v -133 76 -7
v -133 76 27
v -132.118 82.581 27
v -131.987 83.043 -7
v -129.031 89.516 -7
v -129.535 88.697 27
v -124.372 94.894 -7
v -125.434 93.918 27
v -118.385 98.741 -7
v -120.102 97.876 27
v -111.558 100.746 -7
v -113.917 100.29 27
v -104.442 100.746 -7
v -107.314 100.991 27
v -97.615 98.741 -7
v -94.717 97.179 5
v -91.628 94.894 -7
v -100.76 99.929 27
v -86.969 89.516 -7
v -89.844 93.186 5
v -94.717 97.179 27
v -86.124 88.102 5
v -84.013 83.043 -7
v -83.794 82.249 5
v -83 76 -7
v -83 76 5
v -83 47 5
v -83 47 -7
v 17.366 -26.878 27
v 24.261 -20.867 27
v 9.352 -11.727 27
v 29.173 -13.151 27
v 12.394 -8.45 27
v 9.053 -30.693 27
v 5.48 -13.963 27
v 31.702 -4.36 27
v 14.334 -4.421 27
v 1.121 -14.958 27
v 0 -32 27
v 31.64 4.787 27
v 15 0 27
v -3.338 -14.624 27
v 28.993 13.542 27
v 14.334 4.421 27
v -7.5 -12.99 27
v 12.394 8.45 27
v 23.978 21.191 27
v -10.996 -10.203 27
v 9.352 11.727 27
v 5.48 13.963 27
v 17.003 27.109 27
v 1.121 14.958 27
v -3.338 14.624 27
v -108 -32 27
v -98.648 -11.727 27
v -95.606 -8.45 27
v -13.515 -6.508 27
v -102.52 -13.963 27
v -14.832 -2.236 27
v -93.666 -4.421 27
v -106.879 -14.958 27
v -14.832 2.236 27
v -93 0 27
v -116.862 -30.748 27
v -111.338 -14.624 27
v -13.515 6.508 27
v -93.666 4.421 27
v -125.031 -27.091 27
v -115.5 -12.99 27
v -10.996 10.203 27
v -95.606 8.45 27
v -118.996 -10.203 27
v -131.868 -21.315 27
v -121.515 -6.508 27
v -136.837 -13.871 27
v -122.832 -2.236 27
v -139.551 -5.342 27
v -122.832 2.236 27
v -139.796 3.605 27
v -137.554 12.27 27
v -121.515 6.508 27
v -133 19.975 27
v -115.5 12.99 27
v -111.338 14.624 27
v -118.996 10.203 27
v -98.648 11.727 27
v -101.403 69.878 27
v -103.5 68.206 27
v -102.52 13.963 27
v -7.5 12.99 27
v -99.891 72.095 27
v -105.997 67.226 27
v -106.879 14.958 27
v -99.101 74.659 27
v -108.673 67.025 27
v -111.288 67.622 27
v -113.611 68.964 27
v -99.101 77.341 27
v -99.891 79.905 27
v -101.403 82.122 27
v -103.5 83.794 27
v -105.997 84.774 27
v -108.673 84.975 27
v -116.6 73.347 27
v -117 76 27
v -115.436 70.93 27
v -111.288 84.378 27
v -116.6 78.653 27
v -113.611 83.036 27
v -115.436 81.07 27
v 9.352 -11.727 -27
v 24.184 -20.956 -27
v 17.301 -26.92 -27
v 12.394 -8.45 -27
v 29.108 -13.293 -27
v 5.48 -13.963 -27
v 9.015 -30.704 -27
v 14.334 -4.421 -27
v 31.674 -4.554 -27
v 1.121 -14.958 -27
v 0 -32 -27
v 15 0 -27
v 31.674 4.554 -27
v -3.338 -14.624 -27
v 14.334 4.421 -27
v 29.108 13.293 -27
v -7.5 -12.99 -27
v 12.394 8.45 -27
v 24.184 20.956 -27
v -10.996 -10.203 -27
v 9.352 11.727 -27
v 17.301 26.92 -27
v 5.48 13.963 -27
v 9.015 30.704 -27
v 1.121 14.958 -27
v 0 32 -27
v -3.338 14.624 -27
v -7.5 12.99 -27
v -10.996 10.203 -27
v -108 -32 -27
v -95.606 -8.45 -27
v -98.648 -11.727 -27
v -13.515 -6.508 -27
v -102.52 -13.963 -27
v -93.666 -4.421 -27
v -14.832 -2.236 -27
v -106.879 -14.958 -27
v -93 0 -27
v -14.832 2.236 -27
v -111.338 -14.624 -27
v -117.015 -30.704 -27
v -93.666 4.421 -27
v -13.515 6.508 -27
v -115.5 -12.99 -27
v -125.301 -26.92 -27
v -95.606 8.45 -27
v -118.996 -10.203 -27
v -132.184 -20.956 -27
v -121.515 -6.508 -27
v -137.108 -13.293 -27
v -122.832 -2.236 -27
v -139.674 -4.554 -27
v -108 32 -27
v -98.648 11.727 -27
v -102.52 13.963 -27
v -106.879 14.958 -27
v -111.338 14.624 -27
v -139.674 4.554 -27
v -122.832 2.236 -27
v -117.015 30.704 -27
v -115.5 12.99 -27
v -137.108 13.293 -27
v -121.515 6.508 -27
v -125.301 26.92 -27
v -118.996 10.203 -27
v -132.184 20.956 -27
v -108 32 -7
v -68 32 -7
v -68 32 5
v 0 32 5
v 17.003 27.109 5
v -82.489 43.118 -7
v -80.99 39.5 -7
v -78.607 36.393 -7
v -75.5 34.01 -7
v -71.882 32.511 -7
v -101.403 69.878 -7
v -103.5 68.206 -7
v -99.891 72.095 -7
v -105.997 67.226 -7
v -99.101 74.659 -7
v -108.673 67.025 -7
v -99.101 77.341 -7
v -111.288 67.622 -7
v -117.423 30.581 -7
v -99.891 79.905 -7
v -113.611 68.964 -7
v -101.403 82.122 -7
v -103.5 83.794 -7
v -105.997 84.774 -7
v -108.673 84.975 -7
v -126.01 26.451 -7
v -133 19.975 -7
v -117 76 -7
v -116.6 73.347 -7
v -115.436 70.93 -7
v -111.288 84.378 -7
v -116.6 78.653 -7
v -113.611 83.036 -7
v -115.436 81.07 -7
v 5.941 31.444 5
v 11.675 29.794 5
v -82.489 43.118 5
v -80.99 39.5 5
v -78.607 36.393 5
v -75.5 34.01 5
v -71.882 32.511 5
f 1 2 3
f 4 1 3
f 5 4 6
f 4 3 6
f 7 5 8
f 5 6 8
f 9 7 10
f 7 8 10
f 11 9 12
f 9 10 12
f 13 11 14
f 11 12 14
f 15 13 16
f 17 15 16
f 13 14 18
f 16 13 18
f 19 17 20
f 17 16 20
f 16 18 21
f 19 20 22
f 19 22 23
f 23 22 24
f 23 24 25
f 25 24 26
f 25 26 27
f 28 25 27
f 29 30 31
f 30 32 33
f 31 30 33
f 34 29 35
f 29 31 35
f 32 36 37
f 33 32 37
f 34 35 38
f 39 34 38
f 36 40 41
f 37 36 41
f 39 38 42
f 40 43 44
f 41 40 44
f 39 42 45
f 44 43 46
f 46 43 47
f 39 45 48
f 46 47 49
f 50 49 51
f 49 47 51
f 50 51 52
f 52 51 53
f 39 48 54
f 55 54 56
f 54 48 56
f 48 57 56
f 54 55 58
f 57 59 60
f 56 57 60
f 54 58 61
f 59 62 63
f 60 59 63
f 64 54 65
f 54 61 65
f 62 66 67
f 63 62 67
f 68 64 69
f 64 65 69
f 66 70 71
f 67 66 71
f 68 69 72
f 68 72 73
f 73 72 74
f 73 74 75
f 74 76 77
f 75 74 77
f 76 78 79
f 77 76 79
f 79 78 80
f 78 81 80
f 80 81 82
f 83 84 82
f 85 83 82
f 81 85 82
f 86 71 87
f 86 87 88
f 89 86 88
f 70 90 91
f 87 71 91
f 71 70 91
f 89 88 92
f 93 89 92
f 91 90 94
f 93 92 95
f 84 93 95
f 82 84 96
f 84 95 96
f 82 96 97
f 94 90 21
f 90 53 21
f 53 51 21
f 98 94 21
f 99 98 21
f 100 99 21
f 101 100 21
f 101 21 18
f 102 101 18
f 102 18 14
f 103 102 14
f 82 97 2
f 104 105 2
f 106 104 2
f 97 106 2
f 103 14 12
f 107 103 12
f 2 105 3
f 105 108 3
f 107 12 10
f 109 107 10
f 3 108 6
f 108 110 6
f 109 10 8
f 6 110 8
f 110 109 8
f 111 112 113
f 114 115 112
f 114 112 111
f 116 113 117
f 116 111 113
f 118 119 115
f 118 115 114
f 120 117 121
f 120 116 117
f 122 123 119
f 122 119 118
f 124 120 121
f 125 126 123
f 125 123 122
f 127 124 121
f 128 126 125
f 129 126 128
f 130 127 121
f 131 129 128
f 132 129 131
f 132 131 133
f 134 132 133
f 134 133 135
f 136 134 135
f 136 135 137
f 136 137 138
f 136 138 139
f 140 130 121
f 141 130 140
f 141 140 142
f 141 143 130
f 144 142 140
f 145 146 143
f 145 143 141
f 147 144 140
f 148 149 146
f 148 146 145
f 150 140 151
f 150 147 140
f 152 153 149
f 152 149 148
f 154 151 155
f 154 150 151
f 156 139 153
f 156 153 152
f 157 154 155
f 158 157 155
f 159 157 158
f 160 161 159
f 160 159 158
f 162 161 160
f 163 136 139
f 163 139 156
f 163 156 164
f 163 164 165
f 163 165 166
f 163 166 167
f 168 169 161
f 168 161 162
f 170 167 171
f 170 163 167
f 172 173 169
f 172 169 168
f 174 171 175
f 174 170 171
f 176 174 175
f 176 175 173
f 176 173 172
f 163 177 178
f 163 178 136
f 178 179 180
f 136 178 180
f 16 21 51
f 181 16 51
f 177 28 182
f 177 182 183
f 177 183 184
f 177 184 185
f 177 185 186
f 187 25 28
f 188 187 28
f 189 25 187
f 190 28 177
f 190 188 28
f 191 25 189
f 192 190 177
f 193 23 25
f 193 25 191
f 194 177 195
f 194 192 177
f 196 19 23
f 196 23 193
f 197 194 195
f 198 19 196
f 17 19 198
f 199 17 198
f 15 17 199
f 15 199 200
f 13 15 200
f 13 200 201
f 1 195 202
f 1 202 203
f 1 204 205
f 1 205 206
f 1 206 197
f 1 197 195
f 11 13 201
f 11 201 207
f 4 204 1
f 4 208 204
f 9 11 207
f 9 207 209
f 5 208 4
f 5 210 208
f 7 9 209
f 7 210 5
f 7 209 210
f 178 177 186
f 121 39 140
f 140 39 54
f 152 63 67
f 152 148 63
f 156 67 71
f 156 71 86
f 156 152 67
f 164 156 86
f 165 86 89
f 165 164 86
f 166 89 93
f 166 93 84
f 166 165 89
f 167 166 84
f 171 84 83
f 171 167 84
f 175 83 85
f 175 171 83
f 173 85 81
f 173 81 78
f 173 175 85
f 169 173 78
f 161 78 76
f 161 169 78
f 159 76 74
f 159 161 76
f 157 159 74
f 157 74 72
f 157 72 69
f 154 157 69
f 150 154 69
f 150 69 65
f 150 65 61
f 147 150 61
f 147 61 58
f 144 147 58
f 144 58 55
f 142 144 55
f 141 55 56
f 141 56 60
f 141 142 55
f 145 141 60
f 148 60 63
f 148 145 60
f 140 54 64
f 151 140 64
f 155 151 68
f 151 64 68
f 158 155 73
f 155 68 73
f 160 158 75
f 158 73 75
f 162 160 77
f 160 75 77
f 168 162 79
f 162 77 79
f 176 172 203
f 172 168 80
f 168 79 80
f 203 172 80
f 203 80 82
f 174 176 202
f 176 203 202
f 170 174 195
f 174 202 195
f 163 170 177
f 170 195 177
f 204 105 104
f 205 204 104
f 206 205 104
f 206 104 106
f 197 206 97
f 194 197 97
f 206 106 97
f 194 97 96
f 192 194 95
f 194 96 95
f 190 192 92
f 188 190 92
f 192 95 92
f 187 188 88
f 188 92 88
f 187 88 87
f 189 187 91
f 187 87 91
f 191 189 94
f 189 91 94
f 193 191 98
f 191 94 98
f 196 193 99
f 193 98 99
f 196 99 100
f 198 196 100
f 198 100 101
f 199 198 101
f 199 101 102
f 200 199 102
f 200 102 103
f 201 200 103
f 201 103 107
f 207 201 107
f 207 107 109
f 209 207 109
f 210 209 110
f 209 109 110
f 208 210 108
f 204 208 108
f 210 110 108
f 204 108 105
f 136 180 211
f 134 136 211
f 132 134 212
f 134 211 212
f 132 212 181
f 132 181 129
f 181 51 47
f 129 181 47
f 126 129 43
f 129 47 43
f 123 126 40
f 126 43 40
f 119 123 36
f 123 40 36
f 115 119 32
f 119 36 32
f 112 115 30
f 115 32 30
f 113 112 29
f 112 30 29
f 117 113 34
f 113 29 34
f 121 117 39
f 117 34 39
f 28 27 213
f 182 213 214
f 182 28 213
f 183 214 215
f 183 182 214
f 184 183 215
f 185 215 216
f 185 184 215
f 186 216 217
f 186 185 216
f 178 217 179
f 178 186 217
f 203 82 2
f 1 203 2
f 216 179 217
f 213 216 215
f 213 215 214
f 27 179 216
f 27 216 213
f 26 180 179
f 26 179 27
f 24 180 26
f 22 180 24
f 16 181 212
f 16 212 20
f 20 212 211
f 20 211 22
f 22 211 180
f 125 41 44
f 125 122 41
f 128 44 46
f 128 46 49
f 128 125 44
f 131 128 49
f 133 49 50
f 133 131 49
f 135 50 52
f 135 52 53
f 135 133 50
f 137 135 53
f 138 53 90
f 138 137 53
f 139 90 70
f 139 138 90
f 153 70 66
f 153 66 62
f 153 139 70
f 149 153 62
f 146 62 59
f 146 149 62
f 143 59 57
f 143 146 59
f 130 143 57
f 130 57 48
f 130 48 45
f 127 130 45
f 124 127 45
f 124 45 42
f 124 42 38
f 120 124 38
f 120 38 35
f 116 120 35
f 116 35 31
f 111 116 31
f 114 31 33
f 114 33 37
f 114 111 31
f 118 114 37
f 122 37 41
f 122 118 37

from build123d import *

# Parameters (mm, degrees)
SKETCH1_R           = 15
BOSS_EXTRUDE1_DEPTH = 27
BOSS_EXTRUDE3_DEPTH = 34
SKETCH2_3_R         = 9
CUT_EXTRUDE1_DEPTH  = 34
FILLET1_R           = 15
BOSS_EXTRUDE4_DEPTH = 22


with BuildPart() as part:
    # Sketch1 → Boss-Extrude1 (new, symmetric)
    with BuildSketch(Plane.XY):
        with BuildLine():
            Line((-108, 32), (0, 32))
            ThreePointArc((0, 32), (32, 0), (0, -32))
            Line((0, -32), (-108, -32))
            ThreePointArc((-108, -32), (-140, 0), (-108, 32))
        make_face()
        Circle(SKETCH1_R, mode=Mode.SUBTRACT)
        with Locations((-108, 0)):
            Circle(SKETCH1_R, mode=Mode.SUBTRACT)
    extrude(amount=BOSS_EXTRUDE1_DEPTH, both=True)

    # Sketch2 → Boss-Extrude3 (add)
    with BuildSketch(Plane.XY.offset(27)):
        with BuildLine():
            Line((-83, 76), (-83, 32))
            Line((-83, 32), (-108, 32))
            ThreePointArc((-108, 32), (-121.870841731, 28.837471278), (-133, 19.974984355))
            Line((-133, 19.974984355), (-133, 76))
            ThreePointArc((-133, 76), (-108, 101), (-83, 76))
        make_face()
    extrude(amount=-BOSS_EXTRUDE3_DEPTH)

    # Sketch2<3> → Cut-Extrude1 (cut)
    with BuildSketch(Plane.XY.offset(27)):
        with Locations((-108, 76)):
            Circle(SKETCH2_3_R)
    extrude(amount=-CUT_EXTRUDE1_DEPTH, mode=Mode.SUBTRACT)

    # Fillet1
    fillet1_edges = [part.edges().sort_by_distance(p)[0] for p in [
        (-83, 32, 10),
    ]]
    fillet(fillet1_edges, radius=FILLET1_R)

    # Sketch3 → Boss-Extrude4 (add)
    with BuildSketch(Plane.XY.offset(27)):
        with BuildLine():
            Line((-94.716606225, 97.17903326), (17.002744032, 27.109162572))
            ThreePointArc((17.002744032, 27.109162572), (8.846095118, 30.752993369), (0, 32))
            Line((0, 32), (-68, 32))
            ThreePointArc((-68, 32), (-78.606601718, 36.393398282), (-83, 47))
            Line((-83, 47), (-83, 76))
            ThreePointArc((-83, 76), (-86.124387501, 88.101965865), (-94.716606225, 97.17903326))
        make_face()
    extrude(amount=-BOSS_EXTRUDE4_DEPTH)


solid = part.part
